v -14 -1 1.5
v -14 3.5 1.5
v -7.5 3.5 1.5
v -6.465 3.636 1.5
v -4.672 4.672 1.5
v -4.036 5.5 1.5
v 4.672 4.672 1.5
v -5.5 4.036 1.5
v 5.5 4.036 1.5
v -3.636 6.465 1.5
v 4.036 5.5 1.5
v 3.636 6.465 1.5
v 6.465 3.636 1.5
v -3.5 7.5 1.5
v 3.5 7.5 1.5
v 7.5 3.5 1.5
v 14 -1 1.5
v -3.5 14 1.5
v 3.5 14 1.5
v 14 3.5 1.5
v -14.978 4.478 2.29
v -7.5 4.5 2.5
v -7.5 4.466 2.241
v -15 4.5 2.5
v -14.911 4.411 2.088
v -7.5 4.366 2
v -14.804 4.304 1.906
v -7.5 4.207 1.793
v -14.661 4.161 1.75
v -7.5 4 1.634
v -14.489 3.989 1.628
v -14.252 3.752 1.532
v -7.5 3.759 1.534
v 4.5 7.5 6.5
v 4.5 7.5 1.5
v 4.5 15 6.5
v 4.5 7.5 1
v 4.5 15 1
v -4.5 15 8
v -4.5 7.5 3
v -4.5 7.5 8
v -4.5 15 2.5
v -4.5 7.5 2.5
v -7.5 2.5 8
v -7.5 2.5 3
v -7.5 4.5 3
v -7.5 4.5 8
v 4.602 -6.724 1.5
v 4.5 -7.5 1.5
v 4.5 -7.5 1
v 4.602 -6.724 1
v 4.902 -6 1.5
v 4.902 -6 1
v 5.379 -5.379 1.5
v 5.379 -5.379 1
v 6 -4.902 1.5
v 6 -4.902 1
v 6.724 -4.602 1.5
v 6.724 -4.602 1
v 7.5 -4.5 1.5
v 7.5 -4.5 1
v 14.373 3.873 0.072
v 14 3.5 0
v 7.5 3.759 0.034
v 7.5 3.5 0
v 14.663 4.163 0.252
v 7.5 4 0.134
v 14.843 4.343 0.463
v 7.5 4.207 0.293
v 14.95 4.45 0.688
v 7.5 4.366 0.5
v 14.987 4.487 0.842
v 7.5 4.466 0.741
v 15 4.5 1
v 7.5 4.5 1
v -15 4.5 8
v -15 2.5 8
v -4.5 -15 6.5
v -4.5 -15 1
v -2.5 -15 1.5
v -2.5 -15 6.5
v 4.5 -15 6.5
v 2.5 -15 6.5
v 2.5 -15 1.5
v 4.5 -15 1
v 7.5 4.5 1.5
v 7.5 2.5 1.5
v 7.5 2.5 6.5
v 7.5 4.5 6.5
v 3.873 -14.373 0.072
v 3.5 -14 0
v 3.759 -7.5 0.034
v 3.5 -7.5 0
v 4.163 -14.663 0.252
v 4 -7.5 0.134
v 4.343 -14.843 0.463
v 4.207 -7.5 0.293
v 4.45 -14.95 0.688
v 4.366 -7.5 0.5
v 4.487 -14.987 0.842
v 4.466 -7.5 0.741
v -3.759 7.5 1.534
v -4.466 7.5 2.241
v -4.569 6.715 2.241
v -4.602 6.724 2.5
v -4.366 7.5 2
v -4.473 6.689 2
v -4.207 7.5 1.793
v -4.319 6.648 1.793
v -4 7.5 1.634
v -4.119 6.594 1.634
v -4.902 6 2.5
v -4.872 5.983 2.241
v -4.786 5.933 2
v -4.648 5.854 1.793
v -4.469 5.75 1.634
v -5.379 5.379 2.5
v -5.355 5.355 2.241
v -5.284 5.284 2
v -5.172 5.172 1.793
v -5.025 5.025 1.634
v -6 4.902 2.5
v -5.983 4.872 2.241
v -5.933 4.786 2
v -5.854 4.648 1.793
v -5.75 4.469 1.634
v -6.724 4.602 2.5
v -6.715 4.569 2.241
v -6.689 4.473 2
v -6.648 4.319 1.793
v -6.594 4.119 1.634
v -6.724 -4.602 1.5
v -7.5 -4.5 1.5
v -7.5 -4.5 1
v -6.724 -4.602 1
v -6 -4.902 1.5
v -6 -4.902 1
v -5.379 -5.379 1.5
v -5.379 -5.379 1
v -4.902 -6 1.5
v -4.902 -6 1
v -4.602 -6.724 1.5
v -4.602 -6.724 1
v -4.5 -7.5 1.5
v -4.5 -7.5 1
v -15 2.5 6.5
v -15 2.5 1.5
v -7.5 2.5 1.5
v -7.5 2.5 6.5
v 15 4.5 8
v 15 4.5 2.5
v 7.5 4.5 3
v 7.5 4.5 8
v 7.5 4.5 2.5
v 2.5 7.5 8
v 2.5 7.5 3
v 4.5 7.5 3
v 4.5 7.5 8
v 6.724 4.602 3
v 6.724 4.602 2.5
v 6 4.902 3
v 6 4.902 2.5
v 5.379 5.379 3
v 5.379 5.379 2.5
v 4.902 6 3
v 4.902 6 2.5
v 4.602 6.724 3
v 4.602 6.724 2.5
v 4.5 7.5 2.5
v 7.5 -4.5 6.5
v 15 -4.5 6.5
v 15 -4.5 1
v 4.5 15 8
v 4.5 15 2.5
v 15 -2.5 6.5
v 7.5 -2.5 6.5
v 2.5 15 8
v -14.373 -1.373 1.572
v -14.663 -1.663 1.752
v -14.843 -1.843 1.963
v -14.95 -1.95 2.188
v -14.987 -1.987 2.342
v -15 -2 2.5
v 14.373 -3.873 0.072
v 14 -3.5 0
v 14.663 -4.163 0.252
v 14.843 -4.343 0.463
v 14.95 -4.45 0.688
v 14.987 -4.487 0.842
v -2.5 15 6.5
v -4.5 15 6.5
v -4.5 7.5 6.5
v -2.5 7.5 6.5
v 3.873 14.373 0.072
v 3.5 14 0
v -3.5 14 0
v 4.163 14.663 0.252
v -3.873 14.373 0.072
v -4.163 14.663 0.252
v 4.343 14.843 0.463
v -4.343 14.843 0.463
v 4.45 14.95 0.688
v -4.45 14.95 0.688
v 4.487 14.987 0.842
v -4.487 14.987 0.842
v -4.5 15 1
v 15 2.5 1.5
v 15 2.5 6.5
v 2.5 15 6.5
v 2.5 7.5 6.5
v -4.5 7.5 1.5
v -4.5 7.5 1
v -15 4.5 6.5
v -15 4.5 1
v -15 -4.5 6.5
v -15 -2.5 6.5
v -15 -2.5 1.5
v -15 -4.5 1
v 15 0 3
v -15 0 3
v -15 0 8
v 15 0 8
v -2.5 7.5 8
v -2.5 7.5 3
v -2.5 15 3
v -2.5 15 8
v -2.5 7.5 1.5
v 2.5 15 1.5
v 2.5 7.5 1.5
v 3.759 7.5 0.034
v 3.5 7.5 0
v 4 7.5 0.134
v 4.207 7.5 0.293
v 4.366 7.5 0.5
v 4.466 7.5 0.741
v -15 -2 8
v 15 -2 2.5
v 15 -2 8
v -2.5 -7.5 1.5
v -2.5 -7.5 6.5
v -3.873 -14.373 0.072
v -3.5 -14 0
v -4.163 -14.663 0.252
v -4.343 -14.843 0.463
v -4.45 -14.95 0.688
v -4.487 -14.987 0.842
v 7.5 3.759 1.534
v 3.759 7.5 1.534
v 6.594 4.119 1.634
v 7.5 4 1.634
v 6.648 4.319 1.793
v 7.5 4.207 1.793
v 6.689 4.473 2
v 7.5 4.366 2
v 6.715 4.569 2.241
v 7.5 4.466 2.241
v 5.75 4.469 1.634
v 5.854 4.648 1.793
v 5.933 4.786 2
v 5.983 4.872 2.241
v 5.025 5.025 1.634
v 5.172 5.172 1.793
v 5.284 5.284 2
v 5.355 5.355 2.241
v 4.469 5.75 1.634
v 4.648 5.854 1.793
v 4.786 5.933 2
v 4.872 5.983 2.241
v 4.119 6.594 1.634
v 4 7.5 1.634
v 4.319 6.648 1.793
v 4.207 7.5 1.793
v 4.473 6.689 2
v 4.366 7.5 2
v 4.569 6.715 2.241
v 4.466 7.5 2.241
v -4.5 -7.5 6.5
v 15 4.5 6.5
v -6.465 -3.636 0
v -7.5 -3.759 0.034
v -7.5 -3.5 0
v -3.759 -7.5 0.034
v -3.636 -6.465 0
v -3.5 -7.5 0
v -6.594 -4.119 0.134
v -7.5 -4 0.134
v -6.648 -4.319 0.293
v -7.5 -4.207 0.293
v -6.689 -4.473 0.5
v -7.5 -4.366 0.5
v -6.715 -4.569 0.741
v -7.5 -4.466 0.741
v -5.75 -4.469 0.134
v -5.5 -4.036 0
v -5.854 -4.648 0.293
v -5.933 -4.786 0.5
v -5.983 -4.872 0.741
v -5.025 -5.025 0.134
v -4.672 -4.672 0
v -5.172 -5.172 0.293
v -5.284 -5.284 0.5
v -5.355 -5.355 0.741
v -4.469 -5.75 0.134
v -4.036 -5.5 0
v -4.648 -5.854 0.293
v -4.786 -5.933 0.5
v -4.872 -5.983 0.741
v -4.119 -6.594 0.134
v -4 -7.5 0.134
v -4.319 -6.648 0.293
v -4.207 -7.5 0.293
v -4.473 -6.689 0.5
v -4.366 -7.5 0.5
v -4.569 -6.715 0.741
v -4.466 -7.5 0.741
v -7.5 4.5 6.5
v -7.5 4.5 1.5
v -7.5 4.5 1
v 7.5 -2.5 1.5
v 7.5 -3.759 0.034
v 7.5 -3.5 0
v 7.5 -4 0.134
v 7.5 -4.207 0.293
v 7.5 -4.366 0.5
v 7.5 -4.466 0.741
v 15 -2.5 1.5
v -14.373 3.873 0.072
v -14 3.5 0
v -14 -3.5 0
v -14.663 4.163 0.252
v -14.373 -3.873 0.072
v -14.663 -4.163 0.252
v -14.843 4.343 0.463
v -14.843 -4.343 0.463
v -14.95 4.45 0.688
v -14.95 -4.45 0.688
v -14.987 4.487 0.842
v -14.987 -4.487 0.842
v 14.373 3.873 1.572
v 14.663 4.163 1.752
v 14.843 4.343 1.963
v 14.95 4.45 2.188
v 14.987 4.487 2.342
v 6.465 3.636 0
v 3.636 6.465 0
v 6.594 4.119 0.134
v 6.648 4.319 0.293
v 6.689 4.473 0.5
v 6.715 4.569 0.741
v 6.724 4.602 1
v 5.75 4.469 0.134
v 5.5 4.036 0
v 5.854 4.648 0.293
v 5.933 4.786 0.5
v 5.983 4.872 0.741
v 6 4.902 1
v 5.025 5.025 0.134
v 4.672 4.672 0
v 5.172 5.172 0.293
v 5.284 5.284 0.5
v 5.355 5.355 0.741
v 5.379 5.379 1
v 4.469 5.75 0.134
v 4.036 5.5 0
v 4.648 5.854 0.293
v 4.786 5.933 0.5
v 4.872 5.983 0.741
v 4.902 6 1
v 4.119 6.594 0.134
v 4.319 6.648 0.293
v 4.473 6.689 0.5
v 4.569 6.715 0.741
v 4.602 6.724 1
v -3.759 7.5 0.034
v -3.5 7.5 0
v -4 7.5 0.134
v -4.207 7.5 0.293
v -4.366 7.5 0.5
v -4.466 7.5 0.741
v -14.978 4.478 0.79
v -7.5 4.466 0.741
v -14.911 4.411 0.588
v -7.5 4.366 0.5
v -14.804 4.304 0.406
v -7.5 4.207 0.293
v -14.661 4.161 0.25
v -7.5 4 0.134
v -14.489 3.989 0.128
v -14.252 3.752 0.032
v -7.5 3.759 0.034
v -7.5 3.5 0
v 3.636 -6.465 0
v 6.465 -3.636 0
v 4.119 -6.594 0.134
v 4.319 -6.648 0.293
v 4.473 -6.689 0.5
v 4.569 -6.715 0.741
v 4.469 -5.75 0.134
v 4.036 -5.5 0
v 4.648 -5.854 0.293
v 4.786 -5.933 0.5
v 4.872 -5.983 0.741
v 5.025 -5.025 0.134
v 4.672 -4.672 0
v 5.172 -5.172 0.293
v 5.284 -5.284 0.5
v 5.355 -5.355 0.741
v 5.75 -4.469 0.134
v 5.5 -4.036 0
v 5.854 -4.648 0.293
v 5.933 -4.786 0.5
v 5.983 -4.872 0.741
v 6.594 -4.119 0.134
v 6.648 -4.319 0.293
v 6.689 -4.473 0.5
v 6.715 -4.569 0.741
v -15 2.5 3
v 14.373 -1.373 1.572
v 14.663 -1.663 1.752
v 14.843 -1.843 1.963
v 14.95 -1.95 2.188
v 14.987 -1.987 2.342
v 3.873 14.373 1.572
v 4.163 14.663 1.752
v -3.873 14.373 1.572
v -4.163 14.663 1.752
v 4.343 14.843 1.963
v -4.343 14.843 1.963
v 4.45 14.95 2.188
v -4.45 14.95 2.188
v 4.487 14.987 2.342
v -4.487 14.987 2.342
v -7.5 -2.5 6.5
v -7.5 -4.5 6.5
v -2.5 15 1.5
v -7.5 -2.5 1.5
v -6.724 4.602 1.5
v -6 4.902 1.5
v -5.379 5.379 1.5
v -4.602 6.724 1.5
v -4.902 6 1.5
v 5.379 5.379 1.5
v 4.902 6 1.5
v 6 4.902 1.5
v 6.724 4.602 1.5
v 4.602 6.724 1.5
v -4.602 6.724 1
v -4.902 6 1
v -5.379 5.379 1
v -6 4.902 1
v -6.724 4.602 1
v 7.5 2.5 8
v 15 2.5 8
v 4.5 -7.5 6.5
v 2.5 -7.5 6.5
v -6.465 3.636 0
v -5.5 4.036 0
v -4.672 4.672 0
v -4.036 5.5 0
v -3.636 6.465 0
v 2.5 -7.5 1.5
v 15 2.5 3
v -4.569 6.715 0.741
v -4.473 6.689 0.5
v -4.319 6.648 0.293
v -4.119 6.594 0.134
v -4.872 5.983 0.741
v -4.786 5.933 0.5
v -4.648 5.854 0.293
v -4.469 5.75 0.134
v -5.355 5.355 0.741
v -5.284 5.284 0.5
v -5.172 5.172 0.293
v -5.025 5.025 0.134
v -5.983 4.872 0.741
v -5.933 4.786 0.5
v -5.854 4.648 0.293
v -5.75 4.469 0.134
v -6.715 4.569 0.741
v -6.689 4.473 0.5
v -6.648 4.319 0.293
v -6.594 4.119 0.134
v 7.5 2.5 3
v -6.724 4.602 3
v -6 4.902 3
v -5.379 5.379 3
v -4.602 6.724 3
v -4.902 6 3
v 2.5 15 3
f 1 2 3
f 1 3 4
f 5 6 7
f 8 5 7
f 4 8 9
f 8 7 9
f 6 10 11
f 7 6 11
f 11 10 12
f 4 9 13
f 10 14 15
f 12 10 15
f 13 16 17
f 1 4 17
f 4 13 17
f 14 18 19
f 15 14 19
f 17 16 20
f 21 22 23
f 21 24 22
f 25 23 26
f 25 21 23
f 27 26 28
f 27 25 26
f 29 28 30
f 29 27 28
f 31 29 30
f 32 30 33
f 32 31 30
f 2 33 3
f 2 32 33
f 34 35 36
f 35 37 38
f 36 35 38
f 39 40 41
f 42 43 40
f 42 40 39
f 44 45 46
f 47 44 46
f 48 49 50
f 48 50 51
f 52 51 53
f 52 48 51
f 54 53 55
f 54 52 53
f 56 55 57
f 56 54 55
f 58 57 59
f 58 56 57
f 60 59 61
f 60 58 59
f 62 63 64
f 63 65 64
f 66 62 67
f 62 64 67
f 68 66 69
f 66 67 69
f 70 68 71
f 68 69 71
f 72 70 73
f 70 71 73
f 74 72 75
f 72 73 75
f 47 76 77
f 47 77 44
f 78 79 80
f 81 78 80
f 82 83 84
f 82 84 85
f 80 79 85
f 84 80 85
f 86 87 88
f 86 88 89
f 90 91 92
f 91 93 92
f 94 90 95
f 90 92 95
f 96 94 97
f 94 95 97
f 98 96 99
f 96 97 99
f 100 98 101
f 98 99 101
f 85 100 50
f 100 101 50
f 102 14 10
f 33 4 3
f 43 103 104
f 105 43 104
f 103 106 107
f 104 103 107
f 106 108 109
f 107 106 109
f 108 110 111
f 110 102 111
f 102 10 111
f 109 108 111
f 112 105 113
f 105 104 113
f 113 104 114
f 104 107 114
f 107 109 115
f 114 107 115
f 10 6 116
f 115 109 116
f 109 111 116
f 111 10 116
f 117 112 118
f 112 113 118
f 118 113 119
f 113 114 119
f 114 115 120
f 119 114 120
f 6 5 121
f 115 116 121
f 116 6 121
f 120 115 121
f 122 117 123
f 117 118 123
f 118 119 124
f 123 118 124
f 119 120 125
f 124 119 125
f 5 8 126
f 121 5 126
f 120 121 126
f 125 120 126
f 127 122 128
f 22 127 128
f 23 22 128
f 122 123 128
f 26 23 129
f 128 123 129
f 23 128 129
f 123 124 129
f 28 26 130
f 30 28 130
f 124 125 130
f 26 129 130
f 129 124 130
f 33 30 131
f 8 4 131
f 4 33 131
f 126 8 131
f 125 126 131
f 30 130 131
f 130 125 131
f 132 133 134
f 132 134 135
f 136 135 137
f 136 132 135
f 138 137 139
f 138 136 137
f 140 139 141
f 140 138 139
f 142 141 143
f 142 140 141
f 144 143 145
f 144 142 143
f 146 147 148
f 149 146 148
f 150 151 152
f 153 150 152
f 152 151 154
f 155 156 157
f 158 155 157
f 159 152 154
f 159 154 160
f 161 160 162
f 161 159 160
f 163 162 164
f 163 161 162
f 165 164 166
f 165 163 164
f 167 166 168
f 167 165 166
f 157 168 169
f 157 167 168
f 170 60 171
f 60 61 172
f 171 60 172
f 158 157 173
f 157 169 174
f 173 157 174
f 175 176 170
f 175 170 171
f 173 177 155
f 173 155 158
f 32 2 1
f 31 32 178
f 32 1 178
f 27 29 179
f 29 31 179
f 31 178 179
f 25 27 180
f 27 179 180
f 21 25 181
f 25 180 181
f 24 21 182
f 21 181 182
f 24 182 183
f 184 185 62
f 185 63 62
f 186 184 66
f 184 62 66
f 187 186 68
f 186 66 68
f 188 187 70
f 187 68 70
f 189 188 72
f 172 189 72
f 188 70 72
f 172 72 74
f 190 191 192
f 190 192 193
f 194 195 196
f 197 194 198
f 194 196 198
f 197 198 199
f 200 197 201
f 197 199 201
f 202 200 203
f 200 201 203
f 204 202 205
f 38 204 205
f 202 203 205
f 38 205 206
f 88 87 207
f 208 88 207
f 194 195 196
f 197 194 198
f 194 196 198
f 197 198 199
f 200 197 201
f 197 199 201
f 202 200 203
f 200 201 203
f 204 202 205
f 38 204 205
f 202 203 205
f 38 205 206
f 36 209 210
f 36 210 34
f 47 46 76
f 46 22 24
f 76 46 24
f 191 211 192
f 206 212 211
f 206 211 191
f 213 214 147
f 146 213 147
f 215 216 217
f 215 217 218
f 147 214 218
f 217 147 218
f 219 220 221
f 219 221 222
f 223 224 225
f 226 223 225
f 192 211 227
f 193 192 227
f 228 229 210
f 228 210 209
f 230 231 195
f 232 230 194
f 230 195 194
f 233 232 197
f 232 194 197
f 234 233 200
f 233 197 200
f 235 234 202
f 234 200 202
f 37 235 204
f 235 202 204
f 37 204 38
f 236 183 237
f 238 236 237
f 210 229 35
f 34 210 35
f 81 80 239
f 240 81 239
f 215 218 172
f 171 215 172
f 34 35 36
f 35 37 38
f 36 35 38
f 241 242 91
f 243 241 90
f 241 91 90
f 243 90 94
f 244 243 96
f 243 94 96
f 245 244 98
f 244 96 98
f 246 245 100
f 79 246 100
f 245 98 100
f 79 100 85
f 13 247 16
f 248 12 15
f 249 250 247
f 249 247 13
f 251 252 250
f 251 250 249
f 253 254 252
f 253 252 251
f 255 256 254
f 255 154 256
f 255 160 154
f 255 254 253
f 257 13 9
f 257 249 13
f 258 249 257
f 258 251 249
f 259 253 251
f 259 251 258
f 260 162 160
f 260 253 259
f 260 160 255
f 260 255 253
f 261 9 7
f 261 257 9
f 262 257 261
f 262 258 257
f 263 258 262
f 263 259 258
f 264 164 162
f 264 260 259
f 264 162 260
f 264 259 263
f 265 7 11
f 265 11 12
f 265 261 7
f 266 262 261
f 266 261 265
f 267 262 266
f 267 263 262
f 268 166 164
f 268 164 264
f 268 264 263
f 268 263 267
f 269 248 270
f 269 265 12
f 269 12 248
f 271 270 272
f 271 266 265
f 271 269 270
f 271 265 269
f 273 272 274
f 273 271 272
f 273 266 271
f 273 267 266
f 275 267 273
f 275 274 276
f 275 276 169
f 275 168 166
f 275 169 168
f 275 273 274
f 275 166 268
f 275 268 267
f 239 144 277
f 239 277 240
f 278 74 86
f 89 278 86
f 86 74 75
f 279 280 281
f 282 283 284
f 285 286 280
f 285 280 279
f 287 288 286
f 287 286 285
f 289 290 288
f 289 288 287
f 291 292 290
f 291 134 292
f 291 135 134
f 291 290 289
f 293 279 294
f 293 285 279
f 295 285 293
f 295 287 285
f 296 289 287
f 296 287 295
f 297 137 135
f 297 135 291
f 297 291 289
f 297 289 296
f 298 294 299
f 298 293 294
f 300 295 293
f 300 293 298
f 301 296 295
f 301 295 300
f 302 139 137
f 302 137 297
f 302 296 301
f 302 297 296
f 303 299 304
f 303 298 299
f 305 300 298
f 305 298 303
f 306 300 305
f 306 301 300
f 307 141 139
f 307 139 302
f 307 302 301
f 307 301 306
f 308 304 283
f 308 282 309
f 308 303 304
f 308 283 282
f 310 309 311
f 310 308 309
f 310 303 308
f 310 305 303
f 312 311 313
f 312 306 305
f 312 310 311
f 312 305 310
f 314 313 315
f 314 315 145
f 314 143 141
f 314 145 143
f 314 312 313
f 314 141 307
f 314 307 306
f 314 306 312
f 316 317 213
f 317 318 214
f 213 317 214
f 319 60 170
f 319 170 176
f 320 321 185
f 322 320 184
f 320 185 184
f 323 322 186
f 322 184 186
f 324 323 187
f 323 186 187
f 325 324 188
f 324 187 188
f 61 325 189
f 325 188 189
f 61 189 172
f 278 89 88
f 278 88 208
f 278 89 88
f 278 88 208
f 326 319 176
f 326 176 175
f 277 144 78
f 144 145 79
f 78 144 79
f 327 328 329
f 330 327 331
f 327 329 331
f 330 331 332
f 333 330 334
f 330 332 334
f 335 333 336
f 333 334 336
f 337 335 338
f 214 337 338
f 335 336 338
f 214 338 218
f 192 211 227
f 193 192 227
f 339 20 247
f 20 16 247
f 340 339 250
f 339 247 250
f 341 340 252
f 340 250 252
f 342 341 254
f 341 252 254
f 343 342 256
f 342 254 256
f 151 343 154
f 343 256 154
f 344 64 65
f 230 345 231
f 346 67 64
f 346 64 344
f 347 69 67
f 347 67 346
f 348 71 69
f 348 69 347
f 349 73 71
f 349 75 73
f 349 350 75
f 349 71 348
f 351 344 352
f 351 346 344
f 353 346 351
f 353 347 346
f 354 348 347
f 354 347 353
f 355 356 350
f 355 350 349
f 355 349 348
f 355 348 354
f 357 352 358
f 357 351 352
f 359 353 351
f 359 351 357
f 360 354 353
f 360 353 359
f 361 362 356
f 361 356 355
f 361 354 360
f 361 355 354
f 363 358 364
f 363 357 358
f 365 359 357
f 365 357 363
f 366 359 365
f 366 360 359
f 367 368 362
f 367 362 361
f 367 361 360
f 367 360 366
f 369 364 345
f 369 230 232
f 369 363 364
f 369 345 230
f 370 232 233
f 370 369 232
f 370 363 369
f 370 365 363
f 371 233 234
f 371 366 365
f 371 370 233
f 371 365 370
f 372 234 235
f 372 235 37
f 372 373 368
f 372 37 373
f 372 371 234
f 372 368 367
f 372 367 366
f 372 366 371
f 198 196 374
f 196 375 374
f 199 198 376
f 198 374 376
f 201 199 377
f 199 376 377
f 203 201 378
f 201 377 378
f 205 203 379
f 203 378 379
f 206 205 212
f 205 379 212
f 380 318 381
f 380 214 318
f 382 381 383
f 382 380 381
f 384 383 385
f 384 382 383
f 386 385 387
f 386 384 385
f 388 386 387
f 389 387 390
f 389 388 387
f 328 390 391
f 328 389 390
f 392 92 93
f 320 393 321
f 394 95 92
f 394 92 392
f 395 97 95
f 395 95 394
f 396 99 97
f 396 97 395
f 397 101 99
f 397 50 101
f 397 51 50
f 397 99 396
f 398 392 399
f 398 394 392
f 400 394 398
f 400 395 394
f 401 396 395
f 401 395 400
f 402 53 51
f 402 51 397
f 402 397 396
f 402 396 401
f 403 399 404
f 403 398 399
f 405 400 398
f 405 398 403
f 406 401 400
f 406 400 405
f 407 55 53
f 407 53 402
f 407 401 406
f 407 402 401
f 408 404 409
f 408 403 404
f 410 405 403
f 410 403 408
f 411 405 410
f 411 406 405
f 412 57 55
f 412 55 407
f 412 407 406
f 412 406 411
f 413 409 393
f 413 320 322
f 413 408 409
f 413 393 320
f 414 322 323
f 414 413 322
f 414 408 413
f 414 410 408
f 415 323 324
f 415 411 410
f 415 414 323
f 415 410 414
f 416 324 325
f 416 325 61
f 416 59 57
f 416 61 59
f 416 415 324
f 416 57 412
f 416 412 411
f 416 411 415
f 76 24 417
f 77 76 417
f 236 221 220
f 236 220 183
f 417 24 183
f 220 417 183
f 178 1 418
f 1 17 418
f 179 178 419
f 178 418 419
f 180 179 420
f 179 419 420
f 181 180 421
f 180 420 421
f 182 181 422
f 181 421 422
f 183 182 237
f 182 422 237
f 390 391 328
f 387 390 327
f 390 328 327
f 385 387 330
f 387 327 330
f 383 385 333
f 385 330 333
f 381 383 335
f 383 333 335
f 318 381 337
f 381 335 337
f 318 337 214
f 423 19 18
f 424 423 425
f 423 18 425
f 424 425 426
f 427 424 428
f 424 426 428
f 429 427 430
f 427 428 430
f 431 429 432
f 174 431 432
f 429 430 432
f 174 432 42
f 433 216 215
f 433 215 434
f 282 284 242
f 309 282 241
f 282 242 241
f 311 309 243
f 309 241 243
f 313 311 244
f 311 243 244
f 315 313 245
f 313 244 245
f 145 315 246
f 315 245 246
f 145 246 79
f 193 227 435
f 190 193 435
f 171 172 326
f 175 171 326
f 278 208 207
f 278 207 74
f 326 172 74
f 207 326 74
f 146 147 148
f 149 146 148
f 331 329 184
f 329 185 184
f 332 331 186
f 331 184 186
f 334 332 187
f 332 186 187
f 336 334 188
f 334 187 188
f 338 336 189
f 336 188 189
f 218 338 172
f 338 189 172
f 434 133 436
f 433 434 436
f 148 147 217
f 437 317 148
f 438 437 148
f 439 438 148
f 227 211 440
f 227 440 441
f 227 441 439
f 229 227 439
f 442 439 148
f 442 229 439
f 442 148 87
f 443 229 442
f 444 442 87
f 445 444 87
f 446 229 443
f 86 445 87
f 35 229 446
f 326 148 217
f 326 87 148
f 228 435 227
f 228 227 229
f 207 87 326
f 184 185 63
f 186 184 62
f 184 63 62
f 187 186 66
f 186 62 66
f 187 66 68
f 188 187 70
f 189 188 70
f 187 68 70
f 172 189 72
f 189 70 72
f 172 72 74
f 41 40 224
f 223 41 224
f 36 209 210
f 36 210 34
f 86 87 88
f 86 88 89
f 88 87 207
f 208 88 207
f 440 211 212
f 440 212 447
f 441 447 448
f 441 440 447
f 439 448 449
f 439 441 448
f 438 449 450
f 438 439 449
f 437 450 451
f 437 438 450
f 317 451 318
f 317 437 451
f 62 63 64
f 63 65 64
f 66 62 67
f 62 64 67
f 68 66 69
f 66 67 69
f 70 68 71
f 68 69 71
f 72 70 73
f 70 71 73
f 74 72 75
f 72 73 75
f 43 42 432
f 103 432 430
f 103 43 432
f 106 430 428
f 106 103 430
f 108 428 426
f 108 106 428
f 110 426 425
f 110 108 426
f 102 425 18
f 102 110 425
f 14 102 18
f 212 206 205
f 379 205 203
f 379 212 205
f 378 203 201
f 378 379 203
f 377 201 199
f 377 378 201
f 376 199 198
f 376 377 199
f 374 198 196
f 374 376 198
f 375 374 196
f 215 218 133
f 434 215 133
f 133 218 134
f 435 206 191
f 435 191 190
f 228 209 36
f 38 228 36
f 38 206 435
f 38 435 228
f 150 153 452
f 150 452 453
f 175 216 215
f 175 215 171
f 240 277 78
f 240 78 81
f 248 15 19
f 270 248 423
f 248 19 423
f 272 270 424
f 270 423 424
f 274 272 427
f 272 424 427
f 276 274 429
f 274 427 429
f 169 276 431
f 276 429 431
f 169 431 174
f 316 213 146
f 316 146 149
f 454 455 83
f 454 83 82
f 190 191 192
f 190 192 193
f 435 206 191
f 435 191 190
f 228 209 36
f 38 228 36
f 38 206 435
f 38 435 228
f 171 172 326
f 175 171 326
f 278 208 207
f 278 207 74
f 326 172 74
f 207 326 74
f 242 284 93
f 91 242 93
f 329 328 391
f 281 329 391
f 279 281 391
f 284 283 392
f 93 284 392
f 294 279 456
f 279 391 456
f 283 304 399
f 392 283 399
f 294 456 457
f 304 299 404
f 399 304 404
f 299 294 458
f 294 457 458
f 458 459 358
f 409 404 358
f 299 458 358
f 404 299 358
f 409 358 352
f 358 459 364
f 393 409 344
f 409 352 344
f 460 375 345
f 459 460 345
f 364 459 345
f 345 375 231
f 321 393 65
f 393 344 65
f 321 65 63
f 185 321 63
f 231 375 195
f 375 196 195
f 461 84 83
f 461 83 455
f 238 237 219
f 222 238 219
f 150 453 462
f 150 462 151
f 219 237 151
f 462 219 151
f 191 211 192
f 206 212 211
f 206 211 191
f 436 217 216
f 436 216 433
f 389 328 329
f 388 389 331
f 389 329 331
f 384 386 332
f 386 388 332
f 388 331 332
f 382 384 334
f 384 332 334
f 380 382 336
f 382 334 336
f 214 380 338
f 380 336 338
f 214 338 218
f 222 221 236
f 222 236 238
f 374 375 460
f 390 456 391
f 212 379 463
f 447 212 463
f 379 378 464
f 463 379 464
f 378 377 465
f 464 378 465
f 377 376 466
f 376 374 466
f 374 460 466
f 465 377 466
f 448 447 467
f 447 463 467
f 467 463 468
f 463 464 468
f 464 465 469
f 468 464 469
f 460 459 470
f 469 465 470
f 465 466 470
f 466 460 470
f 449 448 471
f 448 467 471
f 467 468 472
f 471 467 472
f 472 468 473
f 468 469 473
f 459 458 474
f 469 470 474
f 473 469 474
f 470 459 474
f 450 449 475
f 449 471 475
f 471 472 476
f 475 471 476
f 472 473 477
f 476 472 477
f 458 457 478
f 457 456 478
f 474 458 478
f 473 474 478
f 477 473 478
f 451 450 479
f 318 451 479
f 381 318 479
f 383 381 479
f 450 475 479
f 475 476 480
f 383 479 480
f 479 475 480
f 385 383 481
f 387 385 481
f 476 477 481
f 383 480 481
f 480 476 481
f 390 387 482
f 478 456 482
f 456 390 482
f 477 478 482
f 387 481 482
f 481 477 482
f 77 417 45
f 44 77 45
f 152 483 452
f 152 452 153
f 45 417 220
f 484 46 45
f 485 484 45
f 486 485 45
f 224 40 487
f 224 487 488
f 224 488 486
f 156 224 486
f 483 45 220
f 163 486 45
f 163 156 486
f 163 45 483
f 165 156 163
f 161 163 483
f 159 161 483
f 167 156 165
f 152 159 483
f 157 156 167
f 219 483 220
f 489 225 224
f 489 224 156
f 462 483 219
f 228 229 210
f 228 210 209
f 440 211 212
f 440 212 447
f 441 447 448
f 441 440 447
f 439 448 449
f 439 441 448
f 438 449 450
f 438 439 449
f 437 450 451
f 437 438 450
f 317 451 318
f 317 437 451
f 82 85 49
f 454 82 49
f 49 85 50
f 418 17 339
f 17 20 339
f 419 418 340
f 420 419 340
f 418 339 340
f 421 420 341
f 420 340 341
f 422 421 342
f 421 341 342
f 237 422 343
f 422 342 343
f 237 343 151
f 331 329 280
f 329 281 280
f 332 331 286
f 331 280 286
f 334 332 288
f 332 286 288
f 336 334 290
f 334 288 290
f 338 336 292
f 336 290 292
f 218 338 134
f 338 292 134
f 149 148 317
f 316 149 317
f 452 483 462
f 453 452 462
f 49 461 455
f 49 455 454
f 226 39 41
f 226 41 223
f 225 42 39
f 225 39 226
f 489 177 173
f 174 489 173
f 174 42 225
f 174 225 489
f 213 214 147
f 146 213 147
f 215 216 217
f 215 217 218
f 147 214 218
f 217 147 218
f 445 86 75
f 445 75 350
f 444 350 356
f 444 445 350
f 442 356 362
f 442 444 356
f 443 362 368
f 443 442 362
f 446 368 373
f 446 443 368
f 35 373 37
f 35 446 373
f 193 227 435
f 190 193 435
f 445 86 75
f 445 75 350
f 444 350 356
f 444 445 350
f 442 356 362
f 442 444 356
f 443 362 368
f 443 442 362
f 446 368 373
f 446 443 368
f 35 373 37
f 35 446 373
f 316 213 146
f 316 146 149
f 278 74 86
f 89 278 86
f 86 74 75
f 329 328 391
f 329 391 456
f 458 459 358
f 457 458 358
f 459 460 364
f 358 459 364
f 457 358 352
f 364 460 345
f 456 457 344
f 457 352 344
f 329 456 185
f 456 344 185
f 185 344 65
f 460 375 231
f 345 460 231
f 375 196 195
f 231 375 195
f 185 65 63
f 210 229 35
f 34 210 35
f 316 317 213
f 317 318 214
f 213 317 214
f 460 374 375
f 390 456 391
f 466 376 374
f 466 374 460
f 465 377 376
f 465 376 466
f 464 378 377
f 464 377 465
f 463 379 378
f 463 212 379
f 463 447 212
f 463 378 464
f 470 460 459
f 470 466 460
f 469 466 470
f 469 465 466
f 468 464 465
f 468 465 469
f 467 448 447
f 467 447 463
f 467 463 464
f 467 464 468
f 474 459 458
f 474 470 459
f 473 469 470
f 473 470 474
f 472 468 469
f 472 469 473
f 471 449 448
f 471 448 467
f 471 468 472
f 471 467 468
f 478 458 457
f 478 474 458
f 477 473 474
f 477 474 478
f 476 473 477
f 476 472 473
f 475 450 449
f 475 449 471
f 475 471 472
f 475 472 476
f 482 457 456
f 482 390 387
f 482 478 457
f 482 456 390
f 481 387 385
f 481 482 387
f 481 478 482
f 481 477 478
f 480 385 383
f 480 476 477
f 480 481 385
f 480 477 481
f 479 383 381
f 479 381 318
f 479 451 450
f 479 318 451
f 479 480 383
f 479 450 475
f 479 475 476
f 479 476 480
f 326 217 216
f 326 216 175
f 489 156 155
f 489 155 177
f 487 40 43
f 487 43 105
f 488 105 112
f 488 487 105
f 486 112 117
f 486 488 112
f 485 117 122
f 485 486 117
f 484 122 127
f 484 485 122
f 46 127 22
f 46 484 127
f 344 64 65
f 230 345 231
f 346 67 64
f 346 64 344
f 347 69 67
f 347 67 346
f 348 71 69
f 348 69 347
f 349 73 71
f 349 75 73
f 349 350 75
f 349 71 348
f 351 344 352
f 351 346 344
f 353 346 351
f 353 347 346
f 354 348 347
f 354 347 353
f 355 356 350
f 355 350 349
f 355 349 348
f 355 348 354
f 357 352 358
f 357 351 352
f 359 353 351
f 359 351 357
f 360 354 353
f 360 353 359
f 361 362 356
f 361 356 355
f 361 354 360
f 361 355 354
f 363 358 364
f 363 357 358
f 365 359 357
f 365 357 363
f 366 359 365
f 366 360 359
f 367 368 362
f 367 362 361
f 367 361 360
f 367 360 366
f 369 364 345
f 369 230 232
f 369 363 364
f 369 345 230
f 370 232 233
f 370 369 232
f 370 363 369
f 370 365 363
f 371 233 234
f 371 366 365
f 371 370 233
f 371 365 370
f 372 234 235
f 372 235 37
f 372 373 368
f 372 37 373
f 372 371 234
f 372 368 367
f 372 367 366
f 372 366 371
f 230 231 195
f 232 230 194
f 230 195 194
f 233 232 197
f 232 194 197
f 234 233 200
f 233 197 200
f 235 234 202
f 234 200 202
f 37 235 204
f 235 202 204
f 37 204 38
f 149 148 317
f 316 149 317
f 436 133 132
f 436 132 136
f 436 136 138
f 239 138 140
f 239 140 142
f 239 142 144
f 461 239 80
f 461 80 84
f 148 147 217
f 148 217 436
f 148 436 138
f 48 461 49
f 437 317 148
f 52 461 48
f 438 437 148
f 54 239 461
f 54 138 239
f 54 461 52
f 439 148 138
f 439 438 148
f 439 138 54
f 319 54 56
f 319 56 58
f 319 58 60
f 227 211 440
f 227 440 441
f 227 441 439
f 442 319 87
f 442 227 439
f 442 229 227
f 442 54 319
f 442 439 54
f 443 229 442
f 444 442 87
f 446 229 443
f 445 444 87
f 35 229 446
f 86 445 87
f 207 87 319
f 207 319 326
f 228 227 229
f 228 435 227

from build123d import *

# Parameters (mm, degrees)
PAD_DEPTH     = 1.5
SKETCH001_W   = 2
SKETCH001_H   = 7.5
SKETCH001_W_2 = 7.5
SKETCH001_H_2 = 2
SKETCH001_W_3 = 30
PAD001_DEPTH  = 5
FILLET_R      = 3
FILLET002_R   = 1
PAD002_DEPTH  = 1.5
SKETCH003_W   = 2
SKETCH003_H   = 7.5
SKETCH003_W_2 = 7.5
SKETCH003_H_2 = 2
PAD003_DEPTH  = 5
FILLET001_R   = 3
FILLET003_R   = 1
PAD004_DEPTH  = 1.5
SKETCH005_W   = 2
SKETCH005_H   = 7.5
SKETCH005_W_2 = 7.5
SKETCH005_H_2 = 2
SKETCH005_W_3 = 30
PAD005_DEPTH  = 5
FILLET004_R   = 3
FILLET005_R   = 1


with BuildPart() as b_t:
    # Sketch (on Sketch) → Pad (new body)
    with BuildSketch(Plane.XY.offset(1.5)):
        Polygon((-15, -2), (15, -2), (15, 4.5), (4.5, 4.5), (4.5, 15), (-4.5, 15), (-4.5, 4.5), (-15, 4.5), align=None)
    extrude(amount=PAD_DEPTH)

    # Sketch001 (on Face10 of Pad) → Pad001 (join)
    with BuildSketch(Plane.XY.offset(3)):
        with Locations((-3.5, 11.25)):
            Rectangle(SKETCH001_W, SKETCH001_H)
        with Locations((3.5, 11.25)):
            Rectangle(SKETCH001_W, SKETCH001_H)
        with Locations((11.25, 3.5)):
            Rectangle(SKETCH001_W_2, SKETCH001_H_2)
        with Locations((-11.25, 3.5)):
            Rectangle(SKETCH001_W_2, SKETCH001_H_2)
        with Locations((0, -1)):
            Rectangle(SKETCH001_W_3, SKETCH001_H_2)
    extrude(amount=PAD001_DEPTH)

    # Fillet
    fillet_edges = [b_t.edges().sort_by_distance(p)[0] for p in [
        (4.5, 4.5, 2.25),
        (-4.5, 4.5, 2.25),
    ]]
    fillet(fillet_edges, radius=FILLET_R)

    # Fillet002
    fillet002_edges = [b_t.edges().sort_by_distance(p)[0] for p in [
        (0, 15, 1.5),
        (-4.5, 11.25, 1.5),
        (-5.37868, 5.37868, 1.5),
        (-11.25, 4.5, 1.5),
        (-15, 1.25, 1.5),
        (0, -2, 1.5),
        (15, 1.25, 1.5),
        (11.25, 4.5, 1.5),
        (5.37868, 5.37868, 1.5),
        (4.5, 11.25, 1.5),
    ]]
    fillet(fillet002_edges, radius=FILLET002_R)


with BuildPart() as b_x:
    # Sketch002 → Pad002 (new body)
    with BuildSketch(Plane.XY):
        Polygon((15, -4.5), (15, 4.5), (4.5, 4.5), (4.5, 15), (-4.5, 15), (-4.5, 4.5), (-15, 4.5), (-15, -4.5), (-4.5, -4.5), (-4.5, -15), (4.5, -15), (4.5, -4.5), align=None)
    extrude(amount=PAD002_DEPTH)

    # Sketch003 (on Face14 of Pad002) → Pad003 (join)
    with BuildSketch(Plane.XY.offset(1.5)):
        with Locations((-3.5, 11.25)):
            Rectangle(SKETCH003_W, SKETCH003_H)
        with Locations((3.5, 11.25)):
            Rectangle(SKETCH003_W, SKETCH003_H)
        with Locations((11.25, 3.5)):
            Rectangle(SKETCH003_W_2, SKETCH003_H_2)
        with Locations((11.25, -3.5)):
            Rectangle(SKETCH003_W_2, SKETCH003_H_2)
        with Locations((3.5, -11.25)):
            Rectangle(SKETCH003_W, SKETCH003_H)
        with Locations((-3.5, -11.25)):
            Rectangle(SKETCH003_W, SKETCH003_H)
        with Locations((-11.25, -3.5)):
            Rectangle(SKETCH003_W_2, SKETCH003_H_2)
        with Locations((-11.25, 3.5)):
            Rectangle(SKETCH003_W_2, SKETCH003_H_2)
    extrude(amount=PAD003_DEPTH)

    # Fillet001
    fillet001_edges = [b_x.edges().sort_by_distance(p)[0] for p in [
        (4.5, -4.5, 0.75),
        (-4.5, -4.5, 0.75),
        (-4.5, 4.5, 0.75),
        (4.5, 4.5, 0.75),
    ]]
    fillet(fillet001_edges, radius=FILLET001_R)

    # Fillet003
    fillet003_edges = [b_x.edges().sort_by_distance(p)[0] for p in [
        (15, 0, 0),
        (11.25, 4.5, 0),
        (5.37868, 5.37868, 0),
        (4.5, 11.25, 0),
        (0, 15, 0),
        (-4.5, 11.25, 0),
        (-5.37868, 5.37868, 0),
        (-11.25, 4.5, 0),
        (-15, 0, 0),
        (-11.25, -4.5, 0),
        (-5.37868, -5.37868, 0),
        (-4.5, -11.25, 0),
        (0, -15, 0),
        (4.5, -11.25, 0),
        (5.37868, -5.37868, 0),
        (11.25, -4.5, 0),
    ]]
    fillet(fillet003_edges, radius=FILLET003_R)


with BuildPart() as b_t2:
    # Sketch004 → Pad004 (new body)
    with BuildSketch(Plane.XY):
        Polygon((-15, -4.5), (15, -4.5), (15, 4.5), (4.5, 4.5), (4.5, 15), (-4.5, 15), (-4.5, 4.5), (-15, 4.5), align=None)
    extrude(amount=PAD004_DEPTH)

    # Sketch005 (on Face10 of Pad004) → Pad005 (join)
    with BuildSketch(Plane.XY.offset(1.5)):
        with Locations((-3.5, 11.25)):
            Rectangle(SKETCH005_W, SKETCH005_H)
        with Locations((3.5, 11.25)):
            Rectangle(SKETCH005_W, SKETCH005_H)
        with Locations((11.25, 3.5)):
            Rectangle(SKETCH005_W_2, SKETCH005_H_2)
        with Locations((-11.25, 3.5)):
            Rectangle(SKETCH005_W_2, SKETCH005_H_2)
        with Locations((0, -3.5)):
            Rectangle(SKETCH005_W_3, SKETCH005_H_2)
    extrude(amount=PAD005_DEPTH)

    # Fillet004
    fillet004_edges = [b_t2.edges().sort_by_distance(p)[0] for p in [
        (4.5, 4.5, 0.75),
        (-4.5, 4.5, 0.75),
    ]]
    fillet(fillet004_edges, radius=FILLET004_R)

    # Fillet005
    fillet005_edges = [b_t2.edges().sort_by_distance(p)[0] for p in [
        (0, -4.5, 0),
        (-15, 0, 0),
        (-11.25, 4.5, 0),
        (-5.37868, 5.37868, 0),
        (-4.5, 11.25, 0),
        (0, 15, 0),
        (4.5, 11.25, 0),
        (5.37868, 5.37868, 0),
        (11.25, 4.5, 0),
        (15, 0, 0),
    ]]
    fillet(fillet005_edges, radius=FILLET005_R)


solid = Compound([b_t.part, b_x.part, b_t2.part])
